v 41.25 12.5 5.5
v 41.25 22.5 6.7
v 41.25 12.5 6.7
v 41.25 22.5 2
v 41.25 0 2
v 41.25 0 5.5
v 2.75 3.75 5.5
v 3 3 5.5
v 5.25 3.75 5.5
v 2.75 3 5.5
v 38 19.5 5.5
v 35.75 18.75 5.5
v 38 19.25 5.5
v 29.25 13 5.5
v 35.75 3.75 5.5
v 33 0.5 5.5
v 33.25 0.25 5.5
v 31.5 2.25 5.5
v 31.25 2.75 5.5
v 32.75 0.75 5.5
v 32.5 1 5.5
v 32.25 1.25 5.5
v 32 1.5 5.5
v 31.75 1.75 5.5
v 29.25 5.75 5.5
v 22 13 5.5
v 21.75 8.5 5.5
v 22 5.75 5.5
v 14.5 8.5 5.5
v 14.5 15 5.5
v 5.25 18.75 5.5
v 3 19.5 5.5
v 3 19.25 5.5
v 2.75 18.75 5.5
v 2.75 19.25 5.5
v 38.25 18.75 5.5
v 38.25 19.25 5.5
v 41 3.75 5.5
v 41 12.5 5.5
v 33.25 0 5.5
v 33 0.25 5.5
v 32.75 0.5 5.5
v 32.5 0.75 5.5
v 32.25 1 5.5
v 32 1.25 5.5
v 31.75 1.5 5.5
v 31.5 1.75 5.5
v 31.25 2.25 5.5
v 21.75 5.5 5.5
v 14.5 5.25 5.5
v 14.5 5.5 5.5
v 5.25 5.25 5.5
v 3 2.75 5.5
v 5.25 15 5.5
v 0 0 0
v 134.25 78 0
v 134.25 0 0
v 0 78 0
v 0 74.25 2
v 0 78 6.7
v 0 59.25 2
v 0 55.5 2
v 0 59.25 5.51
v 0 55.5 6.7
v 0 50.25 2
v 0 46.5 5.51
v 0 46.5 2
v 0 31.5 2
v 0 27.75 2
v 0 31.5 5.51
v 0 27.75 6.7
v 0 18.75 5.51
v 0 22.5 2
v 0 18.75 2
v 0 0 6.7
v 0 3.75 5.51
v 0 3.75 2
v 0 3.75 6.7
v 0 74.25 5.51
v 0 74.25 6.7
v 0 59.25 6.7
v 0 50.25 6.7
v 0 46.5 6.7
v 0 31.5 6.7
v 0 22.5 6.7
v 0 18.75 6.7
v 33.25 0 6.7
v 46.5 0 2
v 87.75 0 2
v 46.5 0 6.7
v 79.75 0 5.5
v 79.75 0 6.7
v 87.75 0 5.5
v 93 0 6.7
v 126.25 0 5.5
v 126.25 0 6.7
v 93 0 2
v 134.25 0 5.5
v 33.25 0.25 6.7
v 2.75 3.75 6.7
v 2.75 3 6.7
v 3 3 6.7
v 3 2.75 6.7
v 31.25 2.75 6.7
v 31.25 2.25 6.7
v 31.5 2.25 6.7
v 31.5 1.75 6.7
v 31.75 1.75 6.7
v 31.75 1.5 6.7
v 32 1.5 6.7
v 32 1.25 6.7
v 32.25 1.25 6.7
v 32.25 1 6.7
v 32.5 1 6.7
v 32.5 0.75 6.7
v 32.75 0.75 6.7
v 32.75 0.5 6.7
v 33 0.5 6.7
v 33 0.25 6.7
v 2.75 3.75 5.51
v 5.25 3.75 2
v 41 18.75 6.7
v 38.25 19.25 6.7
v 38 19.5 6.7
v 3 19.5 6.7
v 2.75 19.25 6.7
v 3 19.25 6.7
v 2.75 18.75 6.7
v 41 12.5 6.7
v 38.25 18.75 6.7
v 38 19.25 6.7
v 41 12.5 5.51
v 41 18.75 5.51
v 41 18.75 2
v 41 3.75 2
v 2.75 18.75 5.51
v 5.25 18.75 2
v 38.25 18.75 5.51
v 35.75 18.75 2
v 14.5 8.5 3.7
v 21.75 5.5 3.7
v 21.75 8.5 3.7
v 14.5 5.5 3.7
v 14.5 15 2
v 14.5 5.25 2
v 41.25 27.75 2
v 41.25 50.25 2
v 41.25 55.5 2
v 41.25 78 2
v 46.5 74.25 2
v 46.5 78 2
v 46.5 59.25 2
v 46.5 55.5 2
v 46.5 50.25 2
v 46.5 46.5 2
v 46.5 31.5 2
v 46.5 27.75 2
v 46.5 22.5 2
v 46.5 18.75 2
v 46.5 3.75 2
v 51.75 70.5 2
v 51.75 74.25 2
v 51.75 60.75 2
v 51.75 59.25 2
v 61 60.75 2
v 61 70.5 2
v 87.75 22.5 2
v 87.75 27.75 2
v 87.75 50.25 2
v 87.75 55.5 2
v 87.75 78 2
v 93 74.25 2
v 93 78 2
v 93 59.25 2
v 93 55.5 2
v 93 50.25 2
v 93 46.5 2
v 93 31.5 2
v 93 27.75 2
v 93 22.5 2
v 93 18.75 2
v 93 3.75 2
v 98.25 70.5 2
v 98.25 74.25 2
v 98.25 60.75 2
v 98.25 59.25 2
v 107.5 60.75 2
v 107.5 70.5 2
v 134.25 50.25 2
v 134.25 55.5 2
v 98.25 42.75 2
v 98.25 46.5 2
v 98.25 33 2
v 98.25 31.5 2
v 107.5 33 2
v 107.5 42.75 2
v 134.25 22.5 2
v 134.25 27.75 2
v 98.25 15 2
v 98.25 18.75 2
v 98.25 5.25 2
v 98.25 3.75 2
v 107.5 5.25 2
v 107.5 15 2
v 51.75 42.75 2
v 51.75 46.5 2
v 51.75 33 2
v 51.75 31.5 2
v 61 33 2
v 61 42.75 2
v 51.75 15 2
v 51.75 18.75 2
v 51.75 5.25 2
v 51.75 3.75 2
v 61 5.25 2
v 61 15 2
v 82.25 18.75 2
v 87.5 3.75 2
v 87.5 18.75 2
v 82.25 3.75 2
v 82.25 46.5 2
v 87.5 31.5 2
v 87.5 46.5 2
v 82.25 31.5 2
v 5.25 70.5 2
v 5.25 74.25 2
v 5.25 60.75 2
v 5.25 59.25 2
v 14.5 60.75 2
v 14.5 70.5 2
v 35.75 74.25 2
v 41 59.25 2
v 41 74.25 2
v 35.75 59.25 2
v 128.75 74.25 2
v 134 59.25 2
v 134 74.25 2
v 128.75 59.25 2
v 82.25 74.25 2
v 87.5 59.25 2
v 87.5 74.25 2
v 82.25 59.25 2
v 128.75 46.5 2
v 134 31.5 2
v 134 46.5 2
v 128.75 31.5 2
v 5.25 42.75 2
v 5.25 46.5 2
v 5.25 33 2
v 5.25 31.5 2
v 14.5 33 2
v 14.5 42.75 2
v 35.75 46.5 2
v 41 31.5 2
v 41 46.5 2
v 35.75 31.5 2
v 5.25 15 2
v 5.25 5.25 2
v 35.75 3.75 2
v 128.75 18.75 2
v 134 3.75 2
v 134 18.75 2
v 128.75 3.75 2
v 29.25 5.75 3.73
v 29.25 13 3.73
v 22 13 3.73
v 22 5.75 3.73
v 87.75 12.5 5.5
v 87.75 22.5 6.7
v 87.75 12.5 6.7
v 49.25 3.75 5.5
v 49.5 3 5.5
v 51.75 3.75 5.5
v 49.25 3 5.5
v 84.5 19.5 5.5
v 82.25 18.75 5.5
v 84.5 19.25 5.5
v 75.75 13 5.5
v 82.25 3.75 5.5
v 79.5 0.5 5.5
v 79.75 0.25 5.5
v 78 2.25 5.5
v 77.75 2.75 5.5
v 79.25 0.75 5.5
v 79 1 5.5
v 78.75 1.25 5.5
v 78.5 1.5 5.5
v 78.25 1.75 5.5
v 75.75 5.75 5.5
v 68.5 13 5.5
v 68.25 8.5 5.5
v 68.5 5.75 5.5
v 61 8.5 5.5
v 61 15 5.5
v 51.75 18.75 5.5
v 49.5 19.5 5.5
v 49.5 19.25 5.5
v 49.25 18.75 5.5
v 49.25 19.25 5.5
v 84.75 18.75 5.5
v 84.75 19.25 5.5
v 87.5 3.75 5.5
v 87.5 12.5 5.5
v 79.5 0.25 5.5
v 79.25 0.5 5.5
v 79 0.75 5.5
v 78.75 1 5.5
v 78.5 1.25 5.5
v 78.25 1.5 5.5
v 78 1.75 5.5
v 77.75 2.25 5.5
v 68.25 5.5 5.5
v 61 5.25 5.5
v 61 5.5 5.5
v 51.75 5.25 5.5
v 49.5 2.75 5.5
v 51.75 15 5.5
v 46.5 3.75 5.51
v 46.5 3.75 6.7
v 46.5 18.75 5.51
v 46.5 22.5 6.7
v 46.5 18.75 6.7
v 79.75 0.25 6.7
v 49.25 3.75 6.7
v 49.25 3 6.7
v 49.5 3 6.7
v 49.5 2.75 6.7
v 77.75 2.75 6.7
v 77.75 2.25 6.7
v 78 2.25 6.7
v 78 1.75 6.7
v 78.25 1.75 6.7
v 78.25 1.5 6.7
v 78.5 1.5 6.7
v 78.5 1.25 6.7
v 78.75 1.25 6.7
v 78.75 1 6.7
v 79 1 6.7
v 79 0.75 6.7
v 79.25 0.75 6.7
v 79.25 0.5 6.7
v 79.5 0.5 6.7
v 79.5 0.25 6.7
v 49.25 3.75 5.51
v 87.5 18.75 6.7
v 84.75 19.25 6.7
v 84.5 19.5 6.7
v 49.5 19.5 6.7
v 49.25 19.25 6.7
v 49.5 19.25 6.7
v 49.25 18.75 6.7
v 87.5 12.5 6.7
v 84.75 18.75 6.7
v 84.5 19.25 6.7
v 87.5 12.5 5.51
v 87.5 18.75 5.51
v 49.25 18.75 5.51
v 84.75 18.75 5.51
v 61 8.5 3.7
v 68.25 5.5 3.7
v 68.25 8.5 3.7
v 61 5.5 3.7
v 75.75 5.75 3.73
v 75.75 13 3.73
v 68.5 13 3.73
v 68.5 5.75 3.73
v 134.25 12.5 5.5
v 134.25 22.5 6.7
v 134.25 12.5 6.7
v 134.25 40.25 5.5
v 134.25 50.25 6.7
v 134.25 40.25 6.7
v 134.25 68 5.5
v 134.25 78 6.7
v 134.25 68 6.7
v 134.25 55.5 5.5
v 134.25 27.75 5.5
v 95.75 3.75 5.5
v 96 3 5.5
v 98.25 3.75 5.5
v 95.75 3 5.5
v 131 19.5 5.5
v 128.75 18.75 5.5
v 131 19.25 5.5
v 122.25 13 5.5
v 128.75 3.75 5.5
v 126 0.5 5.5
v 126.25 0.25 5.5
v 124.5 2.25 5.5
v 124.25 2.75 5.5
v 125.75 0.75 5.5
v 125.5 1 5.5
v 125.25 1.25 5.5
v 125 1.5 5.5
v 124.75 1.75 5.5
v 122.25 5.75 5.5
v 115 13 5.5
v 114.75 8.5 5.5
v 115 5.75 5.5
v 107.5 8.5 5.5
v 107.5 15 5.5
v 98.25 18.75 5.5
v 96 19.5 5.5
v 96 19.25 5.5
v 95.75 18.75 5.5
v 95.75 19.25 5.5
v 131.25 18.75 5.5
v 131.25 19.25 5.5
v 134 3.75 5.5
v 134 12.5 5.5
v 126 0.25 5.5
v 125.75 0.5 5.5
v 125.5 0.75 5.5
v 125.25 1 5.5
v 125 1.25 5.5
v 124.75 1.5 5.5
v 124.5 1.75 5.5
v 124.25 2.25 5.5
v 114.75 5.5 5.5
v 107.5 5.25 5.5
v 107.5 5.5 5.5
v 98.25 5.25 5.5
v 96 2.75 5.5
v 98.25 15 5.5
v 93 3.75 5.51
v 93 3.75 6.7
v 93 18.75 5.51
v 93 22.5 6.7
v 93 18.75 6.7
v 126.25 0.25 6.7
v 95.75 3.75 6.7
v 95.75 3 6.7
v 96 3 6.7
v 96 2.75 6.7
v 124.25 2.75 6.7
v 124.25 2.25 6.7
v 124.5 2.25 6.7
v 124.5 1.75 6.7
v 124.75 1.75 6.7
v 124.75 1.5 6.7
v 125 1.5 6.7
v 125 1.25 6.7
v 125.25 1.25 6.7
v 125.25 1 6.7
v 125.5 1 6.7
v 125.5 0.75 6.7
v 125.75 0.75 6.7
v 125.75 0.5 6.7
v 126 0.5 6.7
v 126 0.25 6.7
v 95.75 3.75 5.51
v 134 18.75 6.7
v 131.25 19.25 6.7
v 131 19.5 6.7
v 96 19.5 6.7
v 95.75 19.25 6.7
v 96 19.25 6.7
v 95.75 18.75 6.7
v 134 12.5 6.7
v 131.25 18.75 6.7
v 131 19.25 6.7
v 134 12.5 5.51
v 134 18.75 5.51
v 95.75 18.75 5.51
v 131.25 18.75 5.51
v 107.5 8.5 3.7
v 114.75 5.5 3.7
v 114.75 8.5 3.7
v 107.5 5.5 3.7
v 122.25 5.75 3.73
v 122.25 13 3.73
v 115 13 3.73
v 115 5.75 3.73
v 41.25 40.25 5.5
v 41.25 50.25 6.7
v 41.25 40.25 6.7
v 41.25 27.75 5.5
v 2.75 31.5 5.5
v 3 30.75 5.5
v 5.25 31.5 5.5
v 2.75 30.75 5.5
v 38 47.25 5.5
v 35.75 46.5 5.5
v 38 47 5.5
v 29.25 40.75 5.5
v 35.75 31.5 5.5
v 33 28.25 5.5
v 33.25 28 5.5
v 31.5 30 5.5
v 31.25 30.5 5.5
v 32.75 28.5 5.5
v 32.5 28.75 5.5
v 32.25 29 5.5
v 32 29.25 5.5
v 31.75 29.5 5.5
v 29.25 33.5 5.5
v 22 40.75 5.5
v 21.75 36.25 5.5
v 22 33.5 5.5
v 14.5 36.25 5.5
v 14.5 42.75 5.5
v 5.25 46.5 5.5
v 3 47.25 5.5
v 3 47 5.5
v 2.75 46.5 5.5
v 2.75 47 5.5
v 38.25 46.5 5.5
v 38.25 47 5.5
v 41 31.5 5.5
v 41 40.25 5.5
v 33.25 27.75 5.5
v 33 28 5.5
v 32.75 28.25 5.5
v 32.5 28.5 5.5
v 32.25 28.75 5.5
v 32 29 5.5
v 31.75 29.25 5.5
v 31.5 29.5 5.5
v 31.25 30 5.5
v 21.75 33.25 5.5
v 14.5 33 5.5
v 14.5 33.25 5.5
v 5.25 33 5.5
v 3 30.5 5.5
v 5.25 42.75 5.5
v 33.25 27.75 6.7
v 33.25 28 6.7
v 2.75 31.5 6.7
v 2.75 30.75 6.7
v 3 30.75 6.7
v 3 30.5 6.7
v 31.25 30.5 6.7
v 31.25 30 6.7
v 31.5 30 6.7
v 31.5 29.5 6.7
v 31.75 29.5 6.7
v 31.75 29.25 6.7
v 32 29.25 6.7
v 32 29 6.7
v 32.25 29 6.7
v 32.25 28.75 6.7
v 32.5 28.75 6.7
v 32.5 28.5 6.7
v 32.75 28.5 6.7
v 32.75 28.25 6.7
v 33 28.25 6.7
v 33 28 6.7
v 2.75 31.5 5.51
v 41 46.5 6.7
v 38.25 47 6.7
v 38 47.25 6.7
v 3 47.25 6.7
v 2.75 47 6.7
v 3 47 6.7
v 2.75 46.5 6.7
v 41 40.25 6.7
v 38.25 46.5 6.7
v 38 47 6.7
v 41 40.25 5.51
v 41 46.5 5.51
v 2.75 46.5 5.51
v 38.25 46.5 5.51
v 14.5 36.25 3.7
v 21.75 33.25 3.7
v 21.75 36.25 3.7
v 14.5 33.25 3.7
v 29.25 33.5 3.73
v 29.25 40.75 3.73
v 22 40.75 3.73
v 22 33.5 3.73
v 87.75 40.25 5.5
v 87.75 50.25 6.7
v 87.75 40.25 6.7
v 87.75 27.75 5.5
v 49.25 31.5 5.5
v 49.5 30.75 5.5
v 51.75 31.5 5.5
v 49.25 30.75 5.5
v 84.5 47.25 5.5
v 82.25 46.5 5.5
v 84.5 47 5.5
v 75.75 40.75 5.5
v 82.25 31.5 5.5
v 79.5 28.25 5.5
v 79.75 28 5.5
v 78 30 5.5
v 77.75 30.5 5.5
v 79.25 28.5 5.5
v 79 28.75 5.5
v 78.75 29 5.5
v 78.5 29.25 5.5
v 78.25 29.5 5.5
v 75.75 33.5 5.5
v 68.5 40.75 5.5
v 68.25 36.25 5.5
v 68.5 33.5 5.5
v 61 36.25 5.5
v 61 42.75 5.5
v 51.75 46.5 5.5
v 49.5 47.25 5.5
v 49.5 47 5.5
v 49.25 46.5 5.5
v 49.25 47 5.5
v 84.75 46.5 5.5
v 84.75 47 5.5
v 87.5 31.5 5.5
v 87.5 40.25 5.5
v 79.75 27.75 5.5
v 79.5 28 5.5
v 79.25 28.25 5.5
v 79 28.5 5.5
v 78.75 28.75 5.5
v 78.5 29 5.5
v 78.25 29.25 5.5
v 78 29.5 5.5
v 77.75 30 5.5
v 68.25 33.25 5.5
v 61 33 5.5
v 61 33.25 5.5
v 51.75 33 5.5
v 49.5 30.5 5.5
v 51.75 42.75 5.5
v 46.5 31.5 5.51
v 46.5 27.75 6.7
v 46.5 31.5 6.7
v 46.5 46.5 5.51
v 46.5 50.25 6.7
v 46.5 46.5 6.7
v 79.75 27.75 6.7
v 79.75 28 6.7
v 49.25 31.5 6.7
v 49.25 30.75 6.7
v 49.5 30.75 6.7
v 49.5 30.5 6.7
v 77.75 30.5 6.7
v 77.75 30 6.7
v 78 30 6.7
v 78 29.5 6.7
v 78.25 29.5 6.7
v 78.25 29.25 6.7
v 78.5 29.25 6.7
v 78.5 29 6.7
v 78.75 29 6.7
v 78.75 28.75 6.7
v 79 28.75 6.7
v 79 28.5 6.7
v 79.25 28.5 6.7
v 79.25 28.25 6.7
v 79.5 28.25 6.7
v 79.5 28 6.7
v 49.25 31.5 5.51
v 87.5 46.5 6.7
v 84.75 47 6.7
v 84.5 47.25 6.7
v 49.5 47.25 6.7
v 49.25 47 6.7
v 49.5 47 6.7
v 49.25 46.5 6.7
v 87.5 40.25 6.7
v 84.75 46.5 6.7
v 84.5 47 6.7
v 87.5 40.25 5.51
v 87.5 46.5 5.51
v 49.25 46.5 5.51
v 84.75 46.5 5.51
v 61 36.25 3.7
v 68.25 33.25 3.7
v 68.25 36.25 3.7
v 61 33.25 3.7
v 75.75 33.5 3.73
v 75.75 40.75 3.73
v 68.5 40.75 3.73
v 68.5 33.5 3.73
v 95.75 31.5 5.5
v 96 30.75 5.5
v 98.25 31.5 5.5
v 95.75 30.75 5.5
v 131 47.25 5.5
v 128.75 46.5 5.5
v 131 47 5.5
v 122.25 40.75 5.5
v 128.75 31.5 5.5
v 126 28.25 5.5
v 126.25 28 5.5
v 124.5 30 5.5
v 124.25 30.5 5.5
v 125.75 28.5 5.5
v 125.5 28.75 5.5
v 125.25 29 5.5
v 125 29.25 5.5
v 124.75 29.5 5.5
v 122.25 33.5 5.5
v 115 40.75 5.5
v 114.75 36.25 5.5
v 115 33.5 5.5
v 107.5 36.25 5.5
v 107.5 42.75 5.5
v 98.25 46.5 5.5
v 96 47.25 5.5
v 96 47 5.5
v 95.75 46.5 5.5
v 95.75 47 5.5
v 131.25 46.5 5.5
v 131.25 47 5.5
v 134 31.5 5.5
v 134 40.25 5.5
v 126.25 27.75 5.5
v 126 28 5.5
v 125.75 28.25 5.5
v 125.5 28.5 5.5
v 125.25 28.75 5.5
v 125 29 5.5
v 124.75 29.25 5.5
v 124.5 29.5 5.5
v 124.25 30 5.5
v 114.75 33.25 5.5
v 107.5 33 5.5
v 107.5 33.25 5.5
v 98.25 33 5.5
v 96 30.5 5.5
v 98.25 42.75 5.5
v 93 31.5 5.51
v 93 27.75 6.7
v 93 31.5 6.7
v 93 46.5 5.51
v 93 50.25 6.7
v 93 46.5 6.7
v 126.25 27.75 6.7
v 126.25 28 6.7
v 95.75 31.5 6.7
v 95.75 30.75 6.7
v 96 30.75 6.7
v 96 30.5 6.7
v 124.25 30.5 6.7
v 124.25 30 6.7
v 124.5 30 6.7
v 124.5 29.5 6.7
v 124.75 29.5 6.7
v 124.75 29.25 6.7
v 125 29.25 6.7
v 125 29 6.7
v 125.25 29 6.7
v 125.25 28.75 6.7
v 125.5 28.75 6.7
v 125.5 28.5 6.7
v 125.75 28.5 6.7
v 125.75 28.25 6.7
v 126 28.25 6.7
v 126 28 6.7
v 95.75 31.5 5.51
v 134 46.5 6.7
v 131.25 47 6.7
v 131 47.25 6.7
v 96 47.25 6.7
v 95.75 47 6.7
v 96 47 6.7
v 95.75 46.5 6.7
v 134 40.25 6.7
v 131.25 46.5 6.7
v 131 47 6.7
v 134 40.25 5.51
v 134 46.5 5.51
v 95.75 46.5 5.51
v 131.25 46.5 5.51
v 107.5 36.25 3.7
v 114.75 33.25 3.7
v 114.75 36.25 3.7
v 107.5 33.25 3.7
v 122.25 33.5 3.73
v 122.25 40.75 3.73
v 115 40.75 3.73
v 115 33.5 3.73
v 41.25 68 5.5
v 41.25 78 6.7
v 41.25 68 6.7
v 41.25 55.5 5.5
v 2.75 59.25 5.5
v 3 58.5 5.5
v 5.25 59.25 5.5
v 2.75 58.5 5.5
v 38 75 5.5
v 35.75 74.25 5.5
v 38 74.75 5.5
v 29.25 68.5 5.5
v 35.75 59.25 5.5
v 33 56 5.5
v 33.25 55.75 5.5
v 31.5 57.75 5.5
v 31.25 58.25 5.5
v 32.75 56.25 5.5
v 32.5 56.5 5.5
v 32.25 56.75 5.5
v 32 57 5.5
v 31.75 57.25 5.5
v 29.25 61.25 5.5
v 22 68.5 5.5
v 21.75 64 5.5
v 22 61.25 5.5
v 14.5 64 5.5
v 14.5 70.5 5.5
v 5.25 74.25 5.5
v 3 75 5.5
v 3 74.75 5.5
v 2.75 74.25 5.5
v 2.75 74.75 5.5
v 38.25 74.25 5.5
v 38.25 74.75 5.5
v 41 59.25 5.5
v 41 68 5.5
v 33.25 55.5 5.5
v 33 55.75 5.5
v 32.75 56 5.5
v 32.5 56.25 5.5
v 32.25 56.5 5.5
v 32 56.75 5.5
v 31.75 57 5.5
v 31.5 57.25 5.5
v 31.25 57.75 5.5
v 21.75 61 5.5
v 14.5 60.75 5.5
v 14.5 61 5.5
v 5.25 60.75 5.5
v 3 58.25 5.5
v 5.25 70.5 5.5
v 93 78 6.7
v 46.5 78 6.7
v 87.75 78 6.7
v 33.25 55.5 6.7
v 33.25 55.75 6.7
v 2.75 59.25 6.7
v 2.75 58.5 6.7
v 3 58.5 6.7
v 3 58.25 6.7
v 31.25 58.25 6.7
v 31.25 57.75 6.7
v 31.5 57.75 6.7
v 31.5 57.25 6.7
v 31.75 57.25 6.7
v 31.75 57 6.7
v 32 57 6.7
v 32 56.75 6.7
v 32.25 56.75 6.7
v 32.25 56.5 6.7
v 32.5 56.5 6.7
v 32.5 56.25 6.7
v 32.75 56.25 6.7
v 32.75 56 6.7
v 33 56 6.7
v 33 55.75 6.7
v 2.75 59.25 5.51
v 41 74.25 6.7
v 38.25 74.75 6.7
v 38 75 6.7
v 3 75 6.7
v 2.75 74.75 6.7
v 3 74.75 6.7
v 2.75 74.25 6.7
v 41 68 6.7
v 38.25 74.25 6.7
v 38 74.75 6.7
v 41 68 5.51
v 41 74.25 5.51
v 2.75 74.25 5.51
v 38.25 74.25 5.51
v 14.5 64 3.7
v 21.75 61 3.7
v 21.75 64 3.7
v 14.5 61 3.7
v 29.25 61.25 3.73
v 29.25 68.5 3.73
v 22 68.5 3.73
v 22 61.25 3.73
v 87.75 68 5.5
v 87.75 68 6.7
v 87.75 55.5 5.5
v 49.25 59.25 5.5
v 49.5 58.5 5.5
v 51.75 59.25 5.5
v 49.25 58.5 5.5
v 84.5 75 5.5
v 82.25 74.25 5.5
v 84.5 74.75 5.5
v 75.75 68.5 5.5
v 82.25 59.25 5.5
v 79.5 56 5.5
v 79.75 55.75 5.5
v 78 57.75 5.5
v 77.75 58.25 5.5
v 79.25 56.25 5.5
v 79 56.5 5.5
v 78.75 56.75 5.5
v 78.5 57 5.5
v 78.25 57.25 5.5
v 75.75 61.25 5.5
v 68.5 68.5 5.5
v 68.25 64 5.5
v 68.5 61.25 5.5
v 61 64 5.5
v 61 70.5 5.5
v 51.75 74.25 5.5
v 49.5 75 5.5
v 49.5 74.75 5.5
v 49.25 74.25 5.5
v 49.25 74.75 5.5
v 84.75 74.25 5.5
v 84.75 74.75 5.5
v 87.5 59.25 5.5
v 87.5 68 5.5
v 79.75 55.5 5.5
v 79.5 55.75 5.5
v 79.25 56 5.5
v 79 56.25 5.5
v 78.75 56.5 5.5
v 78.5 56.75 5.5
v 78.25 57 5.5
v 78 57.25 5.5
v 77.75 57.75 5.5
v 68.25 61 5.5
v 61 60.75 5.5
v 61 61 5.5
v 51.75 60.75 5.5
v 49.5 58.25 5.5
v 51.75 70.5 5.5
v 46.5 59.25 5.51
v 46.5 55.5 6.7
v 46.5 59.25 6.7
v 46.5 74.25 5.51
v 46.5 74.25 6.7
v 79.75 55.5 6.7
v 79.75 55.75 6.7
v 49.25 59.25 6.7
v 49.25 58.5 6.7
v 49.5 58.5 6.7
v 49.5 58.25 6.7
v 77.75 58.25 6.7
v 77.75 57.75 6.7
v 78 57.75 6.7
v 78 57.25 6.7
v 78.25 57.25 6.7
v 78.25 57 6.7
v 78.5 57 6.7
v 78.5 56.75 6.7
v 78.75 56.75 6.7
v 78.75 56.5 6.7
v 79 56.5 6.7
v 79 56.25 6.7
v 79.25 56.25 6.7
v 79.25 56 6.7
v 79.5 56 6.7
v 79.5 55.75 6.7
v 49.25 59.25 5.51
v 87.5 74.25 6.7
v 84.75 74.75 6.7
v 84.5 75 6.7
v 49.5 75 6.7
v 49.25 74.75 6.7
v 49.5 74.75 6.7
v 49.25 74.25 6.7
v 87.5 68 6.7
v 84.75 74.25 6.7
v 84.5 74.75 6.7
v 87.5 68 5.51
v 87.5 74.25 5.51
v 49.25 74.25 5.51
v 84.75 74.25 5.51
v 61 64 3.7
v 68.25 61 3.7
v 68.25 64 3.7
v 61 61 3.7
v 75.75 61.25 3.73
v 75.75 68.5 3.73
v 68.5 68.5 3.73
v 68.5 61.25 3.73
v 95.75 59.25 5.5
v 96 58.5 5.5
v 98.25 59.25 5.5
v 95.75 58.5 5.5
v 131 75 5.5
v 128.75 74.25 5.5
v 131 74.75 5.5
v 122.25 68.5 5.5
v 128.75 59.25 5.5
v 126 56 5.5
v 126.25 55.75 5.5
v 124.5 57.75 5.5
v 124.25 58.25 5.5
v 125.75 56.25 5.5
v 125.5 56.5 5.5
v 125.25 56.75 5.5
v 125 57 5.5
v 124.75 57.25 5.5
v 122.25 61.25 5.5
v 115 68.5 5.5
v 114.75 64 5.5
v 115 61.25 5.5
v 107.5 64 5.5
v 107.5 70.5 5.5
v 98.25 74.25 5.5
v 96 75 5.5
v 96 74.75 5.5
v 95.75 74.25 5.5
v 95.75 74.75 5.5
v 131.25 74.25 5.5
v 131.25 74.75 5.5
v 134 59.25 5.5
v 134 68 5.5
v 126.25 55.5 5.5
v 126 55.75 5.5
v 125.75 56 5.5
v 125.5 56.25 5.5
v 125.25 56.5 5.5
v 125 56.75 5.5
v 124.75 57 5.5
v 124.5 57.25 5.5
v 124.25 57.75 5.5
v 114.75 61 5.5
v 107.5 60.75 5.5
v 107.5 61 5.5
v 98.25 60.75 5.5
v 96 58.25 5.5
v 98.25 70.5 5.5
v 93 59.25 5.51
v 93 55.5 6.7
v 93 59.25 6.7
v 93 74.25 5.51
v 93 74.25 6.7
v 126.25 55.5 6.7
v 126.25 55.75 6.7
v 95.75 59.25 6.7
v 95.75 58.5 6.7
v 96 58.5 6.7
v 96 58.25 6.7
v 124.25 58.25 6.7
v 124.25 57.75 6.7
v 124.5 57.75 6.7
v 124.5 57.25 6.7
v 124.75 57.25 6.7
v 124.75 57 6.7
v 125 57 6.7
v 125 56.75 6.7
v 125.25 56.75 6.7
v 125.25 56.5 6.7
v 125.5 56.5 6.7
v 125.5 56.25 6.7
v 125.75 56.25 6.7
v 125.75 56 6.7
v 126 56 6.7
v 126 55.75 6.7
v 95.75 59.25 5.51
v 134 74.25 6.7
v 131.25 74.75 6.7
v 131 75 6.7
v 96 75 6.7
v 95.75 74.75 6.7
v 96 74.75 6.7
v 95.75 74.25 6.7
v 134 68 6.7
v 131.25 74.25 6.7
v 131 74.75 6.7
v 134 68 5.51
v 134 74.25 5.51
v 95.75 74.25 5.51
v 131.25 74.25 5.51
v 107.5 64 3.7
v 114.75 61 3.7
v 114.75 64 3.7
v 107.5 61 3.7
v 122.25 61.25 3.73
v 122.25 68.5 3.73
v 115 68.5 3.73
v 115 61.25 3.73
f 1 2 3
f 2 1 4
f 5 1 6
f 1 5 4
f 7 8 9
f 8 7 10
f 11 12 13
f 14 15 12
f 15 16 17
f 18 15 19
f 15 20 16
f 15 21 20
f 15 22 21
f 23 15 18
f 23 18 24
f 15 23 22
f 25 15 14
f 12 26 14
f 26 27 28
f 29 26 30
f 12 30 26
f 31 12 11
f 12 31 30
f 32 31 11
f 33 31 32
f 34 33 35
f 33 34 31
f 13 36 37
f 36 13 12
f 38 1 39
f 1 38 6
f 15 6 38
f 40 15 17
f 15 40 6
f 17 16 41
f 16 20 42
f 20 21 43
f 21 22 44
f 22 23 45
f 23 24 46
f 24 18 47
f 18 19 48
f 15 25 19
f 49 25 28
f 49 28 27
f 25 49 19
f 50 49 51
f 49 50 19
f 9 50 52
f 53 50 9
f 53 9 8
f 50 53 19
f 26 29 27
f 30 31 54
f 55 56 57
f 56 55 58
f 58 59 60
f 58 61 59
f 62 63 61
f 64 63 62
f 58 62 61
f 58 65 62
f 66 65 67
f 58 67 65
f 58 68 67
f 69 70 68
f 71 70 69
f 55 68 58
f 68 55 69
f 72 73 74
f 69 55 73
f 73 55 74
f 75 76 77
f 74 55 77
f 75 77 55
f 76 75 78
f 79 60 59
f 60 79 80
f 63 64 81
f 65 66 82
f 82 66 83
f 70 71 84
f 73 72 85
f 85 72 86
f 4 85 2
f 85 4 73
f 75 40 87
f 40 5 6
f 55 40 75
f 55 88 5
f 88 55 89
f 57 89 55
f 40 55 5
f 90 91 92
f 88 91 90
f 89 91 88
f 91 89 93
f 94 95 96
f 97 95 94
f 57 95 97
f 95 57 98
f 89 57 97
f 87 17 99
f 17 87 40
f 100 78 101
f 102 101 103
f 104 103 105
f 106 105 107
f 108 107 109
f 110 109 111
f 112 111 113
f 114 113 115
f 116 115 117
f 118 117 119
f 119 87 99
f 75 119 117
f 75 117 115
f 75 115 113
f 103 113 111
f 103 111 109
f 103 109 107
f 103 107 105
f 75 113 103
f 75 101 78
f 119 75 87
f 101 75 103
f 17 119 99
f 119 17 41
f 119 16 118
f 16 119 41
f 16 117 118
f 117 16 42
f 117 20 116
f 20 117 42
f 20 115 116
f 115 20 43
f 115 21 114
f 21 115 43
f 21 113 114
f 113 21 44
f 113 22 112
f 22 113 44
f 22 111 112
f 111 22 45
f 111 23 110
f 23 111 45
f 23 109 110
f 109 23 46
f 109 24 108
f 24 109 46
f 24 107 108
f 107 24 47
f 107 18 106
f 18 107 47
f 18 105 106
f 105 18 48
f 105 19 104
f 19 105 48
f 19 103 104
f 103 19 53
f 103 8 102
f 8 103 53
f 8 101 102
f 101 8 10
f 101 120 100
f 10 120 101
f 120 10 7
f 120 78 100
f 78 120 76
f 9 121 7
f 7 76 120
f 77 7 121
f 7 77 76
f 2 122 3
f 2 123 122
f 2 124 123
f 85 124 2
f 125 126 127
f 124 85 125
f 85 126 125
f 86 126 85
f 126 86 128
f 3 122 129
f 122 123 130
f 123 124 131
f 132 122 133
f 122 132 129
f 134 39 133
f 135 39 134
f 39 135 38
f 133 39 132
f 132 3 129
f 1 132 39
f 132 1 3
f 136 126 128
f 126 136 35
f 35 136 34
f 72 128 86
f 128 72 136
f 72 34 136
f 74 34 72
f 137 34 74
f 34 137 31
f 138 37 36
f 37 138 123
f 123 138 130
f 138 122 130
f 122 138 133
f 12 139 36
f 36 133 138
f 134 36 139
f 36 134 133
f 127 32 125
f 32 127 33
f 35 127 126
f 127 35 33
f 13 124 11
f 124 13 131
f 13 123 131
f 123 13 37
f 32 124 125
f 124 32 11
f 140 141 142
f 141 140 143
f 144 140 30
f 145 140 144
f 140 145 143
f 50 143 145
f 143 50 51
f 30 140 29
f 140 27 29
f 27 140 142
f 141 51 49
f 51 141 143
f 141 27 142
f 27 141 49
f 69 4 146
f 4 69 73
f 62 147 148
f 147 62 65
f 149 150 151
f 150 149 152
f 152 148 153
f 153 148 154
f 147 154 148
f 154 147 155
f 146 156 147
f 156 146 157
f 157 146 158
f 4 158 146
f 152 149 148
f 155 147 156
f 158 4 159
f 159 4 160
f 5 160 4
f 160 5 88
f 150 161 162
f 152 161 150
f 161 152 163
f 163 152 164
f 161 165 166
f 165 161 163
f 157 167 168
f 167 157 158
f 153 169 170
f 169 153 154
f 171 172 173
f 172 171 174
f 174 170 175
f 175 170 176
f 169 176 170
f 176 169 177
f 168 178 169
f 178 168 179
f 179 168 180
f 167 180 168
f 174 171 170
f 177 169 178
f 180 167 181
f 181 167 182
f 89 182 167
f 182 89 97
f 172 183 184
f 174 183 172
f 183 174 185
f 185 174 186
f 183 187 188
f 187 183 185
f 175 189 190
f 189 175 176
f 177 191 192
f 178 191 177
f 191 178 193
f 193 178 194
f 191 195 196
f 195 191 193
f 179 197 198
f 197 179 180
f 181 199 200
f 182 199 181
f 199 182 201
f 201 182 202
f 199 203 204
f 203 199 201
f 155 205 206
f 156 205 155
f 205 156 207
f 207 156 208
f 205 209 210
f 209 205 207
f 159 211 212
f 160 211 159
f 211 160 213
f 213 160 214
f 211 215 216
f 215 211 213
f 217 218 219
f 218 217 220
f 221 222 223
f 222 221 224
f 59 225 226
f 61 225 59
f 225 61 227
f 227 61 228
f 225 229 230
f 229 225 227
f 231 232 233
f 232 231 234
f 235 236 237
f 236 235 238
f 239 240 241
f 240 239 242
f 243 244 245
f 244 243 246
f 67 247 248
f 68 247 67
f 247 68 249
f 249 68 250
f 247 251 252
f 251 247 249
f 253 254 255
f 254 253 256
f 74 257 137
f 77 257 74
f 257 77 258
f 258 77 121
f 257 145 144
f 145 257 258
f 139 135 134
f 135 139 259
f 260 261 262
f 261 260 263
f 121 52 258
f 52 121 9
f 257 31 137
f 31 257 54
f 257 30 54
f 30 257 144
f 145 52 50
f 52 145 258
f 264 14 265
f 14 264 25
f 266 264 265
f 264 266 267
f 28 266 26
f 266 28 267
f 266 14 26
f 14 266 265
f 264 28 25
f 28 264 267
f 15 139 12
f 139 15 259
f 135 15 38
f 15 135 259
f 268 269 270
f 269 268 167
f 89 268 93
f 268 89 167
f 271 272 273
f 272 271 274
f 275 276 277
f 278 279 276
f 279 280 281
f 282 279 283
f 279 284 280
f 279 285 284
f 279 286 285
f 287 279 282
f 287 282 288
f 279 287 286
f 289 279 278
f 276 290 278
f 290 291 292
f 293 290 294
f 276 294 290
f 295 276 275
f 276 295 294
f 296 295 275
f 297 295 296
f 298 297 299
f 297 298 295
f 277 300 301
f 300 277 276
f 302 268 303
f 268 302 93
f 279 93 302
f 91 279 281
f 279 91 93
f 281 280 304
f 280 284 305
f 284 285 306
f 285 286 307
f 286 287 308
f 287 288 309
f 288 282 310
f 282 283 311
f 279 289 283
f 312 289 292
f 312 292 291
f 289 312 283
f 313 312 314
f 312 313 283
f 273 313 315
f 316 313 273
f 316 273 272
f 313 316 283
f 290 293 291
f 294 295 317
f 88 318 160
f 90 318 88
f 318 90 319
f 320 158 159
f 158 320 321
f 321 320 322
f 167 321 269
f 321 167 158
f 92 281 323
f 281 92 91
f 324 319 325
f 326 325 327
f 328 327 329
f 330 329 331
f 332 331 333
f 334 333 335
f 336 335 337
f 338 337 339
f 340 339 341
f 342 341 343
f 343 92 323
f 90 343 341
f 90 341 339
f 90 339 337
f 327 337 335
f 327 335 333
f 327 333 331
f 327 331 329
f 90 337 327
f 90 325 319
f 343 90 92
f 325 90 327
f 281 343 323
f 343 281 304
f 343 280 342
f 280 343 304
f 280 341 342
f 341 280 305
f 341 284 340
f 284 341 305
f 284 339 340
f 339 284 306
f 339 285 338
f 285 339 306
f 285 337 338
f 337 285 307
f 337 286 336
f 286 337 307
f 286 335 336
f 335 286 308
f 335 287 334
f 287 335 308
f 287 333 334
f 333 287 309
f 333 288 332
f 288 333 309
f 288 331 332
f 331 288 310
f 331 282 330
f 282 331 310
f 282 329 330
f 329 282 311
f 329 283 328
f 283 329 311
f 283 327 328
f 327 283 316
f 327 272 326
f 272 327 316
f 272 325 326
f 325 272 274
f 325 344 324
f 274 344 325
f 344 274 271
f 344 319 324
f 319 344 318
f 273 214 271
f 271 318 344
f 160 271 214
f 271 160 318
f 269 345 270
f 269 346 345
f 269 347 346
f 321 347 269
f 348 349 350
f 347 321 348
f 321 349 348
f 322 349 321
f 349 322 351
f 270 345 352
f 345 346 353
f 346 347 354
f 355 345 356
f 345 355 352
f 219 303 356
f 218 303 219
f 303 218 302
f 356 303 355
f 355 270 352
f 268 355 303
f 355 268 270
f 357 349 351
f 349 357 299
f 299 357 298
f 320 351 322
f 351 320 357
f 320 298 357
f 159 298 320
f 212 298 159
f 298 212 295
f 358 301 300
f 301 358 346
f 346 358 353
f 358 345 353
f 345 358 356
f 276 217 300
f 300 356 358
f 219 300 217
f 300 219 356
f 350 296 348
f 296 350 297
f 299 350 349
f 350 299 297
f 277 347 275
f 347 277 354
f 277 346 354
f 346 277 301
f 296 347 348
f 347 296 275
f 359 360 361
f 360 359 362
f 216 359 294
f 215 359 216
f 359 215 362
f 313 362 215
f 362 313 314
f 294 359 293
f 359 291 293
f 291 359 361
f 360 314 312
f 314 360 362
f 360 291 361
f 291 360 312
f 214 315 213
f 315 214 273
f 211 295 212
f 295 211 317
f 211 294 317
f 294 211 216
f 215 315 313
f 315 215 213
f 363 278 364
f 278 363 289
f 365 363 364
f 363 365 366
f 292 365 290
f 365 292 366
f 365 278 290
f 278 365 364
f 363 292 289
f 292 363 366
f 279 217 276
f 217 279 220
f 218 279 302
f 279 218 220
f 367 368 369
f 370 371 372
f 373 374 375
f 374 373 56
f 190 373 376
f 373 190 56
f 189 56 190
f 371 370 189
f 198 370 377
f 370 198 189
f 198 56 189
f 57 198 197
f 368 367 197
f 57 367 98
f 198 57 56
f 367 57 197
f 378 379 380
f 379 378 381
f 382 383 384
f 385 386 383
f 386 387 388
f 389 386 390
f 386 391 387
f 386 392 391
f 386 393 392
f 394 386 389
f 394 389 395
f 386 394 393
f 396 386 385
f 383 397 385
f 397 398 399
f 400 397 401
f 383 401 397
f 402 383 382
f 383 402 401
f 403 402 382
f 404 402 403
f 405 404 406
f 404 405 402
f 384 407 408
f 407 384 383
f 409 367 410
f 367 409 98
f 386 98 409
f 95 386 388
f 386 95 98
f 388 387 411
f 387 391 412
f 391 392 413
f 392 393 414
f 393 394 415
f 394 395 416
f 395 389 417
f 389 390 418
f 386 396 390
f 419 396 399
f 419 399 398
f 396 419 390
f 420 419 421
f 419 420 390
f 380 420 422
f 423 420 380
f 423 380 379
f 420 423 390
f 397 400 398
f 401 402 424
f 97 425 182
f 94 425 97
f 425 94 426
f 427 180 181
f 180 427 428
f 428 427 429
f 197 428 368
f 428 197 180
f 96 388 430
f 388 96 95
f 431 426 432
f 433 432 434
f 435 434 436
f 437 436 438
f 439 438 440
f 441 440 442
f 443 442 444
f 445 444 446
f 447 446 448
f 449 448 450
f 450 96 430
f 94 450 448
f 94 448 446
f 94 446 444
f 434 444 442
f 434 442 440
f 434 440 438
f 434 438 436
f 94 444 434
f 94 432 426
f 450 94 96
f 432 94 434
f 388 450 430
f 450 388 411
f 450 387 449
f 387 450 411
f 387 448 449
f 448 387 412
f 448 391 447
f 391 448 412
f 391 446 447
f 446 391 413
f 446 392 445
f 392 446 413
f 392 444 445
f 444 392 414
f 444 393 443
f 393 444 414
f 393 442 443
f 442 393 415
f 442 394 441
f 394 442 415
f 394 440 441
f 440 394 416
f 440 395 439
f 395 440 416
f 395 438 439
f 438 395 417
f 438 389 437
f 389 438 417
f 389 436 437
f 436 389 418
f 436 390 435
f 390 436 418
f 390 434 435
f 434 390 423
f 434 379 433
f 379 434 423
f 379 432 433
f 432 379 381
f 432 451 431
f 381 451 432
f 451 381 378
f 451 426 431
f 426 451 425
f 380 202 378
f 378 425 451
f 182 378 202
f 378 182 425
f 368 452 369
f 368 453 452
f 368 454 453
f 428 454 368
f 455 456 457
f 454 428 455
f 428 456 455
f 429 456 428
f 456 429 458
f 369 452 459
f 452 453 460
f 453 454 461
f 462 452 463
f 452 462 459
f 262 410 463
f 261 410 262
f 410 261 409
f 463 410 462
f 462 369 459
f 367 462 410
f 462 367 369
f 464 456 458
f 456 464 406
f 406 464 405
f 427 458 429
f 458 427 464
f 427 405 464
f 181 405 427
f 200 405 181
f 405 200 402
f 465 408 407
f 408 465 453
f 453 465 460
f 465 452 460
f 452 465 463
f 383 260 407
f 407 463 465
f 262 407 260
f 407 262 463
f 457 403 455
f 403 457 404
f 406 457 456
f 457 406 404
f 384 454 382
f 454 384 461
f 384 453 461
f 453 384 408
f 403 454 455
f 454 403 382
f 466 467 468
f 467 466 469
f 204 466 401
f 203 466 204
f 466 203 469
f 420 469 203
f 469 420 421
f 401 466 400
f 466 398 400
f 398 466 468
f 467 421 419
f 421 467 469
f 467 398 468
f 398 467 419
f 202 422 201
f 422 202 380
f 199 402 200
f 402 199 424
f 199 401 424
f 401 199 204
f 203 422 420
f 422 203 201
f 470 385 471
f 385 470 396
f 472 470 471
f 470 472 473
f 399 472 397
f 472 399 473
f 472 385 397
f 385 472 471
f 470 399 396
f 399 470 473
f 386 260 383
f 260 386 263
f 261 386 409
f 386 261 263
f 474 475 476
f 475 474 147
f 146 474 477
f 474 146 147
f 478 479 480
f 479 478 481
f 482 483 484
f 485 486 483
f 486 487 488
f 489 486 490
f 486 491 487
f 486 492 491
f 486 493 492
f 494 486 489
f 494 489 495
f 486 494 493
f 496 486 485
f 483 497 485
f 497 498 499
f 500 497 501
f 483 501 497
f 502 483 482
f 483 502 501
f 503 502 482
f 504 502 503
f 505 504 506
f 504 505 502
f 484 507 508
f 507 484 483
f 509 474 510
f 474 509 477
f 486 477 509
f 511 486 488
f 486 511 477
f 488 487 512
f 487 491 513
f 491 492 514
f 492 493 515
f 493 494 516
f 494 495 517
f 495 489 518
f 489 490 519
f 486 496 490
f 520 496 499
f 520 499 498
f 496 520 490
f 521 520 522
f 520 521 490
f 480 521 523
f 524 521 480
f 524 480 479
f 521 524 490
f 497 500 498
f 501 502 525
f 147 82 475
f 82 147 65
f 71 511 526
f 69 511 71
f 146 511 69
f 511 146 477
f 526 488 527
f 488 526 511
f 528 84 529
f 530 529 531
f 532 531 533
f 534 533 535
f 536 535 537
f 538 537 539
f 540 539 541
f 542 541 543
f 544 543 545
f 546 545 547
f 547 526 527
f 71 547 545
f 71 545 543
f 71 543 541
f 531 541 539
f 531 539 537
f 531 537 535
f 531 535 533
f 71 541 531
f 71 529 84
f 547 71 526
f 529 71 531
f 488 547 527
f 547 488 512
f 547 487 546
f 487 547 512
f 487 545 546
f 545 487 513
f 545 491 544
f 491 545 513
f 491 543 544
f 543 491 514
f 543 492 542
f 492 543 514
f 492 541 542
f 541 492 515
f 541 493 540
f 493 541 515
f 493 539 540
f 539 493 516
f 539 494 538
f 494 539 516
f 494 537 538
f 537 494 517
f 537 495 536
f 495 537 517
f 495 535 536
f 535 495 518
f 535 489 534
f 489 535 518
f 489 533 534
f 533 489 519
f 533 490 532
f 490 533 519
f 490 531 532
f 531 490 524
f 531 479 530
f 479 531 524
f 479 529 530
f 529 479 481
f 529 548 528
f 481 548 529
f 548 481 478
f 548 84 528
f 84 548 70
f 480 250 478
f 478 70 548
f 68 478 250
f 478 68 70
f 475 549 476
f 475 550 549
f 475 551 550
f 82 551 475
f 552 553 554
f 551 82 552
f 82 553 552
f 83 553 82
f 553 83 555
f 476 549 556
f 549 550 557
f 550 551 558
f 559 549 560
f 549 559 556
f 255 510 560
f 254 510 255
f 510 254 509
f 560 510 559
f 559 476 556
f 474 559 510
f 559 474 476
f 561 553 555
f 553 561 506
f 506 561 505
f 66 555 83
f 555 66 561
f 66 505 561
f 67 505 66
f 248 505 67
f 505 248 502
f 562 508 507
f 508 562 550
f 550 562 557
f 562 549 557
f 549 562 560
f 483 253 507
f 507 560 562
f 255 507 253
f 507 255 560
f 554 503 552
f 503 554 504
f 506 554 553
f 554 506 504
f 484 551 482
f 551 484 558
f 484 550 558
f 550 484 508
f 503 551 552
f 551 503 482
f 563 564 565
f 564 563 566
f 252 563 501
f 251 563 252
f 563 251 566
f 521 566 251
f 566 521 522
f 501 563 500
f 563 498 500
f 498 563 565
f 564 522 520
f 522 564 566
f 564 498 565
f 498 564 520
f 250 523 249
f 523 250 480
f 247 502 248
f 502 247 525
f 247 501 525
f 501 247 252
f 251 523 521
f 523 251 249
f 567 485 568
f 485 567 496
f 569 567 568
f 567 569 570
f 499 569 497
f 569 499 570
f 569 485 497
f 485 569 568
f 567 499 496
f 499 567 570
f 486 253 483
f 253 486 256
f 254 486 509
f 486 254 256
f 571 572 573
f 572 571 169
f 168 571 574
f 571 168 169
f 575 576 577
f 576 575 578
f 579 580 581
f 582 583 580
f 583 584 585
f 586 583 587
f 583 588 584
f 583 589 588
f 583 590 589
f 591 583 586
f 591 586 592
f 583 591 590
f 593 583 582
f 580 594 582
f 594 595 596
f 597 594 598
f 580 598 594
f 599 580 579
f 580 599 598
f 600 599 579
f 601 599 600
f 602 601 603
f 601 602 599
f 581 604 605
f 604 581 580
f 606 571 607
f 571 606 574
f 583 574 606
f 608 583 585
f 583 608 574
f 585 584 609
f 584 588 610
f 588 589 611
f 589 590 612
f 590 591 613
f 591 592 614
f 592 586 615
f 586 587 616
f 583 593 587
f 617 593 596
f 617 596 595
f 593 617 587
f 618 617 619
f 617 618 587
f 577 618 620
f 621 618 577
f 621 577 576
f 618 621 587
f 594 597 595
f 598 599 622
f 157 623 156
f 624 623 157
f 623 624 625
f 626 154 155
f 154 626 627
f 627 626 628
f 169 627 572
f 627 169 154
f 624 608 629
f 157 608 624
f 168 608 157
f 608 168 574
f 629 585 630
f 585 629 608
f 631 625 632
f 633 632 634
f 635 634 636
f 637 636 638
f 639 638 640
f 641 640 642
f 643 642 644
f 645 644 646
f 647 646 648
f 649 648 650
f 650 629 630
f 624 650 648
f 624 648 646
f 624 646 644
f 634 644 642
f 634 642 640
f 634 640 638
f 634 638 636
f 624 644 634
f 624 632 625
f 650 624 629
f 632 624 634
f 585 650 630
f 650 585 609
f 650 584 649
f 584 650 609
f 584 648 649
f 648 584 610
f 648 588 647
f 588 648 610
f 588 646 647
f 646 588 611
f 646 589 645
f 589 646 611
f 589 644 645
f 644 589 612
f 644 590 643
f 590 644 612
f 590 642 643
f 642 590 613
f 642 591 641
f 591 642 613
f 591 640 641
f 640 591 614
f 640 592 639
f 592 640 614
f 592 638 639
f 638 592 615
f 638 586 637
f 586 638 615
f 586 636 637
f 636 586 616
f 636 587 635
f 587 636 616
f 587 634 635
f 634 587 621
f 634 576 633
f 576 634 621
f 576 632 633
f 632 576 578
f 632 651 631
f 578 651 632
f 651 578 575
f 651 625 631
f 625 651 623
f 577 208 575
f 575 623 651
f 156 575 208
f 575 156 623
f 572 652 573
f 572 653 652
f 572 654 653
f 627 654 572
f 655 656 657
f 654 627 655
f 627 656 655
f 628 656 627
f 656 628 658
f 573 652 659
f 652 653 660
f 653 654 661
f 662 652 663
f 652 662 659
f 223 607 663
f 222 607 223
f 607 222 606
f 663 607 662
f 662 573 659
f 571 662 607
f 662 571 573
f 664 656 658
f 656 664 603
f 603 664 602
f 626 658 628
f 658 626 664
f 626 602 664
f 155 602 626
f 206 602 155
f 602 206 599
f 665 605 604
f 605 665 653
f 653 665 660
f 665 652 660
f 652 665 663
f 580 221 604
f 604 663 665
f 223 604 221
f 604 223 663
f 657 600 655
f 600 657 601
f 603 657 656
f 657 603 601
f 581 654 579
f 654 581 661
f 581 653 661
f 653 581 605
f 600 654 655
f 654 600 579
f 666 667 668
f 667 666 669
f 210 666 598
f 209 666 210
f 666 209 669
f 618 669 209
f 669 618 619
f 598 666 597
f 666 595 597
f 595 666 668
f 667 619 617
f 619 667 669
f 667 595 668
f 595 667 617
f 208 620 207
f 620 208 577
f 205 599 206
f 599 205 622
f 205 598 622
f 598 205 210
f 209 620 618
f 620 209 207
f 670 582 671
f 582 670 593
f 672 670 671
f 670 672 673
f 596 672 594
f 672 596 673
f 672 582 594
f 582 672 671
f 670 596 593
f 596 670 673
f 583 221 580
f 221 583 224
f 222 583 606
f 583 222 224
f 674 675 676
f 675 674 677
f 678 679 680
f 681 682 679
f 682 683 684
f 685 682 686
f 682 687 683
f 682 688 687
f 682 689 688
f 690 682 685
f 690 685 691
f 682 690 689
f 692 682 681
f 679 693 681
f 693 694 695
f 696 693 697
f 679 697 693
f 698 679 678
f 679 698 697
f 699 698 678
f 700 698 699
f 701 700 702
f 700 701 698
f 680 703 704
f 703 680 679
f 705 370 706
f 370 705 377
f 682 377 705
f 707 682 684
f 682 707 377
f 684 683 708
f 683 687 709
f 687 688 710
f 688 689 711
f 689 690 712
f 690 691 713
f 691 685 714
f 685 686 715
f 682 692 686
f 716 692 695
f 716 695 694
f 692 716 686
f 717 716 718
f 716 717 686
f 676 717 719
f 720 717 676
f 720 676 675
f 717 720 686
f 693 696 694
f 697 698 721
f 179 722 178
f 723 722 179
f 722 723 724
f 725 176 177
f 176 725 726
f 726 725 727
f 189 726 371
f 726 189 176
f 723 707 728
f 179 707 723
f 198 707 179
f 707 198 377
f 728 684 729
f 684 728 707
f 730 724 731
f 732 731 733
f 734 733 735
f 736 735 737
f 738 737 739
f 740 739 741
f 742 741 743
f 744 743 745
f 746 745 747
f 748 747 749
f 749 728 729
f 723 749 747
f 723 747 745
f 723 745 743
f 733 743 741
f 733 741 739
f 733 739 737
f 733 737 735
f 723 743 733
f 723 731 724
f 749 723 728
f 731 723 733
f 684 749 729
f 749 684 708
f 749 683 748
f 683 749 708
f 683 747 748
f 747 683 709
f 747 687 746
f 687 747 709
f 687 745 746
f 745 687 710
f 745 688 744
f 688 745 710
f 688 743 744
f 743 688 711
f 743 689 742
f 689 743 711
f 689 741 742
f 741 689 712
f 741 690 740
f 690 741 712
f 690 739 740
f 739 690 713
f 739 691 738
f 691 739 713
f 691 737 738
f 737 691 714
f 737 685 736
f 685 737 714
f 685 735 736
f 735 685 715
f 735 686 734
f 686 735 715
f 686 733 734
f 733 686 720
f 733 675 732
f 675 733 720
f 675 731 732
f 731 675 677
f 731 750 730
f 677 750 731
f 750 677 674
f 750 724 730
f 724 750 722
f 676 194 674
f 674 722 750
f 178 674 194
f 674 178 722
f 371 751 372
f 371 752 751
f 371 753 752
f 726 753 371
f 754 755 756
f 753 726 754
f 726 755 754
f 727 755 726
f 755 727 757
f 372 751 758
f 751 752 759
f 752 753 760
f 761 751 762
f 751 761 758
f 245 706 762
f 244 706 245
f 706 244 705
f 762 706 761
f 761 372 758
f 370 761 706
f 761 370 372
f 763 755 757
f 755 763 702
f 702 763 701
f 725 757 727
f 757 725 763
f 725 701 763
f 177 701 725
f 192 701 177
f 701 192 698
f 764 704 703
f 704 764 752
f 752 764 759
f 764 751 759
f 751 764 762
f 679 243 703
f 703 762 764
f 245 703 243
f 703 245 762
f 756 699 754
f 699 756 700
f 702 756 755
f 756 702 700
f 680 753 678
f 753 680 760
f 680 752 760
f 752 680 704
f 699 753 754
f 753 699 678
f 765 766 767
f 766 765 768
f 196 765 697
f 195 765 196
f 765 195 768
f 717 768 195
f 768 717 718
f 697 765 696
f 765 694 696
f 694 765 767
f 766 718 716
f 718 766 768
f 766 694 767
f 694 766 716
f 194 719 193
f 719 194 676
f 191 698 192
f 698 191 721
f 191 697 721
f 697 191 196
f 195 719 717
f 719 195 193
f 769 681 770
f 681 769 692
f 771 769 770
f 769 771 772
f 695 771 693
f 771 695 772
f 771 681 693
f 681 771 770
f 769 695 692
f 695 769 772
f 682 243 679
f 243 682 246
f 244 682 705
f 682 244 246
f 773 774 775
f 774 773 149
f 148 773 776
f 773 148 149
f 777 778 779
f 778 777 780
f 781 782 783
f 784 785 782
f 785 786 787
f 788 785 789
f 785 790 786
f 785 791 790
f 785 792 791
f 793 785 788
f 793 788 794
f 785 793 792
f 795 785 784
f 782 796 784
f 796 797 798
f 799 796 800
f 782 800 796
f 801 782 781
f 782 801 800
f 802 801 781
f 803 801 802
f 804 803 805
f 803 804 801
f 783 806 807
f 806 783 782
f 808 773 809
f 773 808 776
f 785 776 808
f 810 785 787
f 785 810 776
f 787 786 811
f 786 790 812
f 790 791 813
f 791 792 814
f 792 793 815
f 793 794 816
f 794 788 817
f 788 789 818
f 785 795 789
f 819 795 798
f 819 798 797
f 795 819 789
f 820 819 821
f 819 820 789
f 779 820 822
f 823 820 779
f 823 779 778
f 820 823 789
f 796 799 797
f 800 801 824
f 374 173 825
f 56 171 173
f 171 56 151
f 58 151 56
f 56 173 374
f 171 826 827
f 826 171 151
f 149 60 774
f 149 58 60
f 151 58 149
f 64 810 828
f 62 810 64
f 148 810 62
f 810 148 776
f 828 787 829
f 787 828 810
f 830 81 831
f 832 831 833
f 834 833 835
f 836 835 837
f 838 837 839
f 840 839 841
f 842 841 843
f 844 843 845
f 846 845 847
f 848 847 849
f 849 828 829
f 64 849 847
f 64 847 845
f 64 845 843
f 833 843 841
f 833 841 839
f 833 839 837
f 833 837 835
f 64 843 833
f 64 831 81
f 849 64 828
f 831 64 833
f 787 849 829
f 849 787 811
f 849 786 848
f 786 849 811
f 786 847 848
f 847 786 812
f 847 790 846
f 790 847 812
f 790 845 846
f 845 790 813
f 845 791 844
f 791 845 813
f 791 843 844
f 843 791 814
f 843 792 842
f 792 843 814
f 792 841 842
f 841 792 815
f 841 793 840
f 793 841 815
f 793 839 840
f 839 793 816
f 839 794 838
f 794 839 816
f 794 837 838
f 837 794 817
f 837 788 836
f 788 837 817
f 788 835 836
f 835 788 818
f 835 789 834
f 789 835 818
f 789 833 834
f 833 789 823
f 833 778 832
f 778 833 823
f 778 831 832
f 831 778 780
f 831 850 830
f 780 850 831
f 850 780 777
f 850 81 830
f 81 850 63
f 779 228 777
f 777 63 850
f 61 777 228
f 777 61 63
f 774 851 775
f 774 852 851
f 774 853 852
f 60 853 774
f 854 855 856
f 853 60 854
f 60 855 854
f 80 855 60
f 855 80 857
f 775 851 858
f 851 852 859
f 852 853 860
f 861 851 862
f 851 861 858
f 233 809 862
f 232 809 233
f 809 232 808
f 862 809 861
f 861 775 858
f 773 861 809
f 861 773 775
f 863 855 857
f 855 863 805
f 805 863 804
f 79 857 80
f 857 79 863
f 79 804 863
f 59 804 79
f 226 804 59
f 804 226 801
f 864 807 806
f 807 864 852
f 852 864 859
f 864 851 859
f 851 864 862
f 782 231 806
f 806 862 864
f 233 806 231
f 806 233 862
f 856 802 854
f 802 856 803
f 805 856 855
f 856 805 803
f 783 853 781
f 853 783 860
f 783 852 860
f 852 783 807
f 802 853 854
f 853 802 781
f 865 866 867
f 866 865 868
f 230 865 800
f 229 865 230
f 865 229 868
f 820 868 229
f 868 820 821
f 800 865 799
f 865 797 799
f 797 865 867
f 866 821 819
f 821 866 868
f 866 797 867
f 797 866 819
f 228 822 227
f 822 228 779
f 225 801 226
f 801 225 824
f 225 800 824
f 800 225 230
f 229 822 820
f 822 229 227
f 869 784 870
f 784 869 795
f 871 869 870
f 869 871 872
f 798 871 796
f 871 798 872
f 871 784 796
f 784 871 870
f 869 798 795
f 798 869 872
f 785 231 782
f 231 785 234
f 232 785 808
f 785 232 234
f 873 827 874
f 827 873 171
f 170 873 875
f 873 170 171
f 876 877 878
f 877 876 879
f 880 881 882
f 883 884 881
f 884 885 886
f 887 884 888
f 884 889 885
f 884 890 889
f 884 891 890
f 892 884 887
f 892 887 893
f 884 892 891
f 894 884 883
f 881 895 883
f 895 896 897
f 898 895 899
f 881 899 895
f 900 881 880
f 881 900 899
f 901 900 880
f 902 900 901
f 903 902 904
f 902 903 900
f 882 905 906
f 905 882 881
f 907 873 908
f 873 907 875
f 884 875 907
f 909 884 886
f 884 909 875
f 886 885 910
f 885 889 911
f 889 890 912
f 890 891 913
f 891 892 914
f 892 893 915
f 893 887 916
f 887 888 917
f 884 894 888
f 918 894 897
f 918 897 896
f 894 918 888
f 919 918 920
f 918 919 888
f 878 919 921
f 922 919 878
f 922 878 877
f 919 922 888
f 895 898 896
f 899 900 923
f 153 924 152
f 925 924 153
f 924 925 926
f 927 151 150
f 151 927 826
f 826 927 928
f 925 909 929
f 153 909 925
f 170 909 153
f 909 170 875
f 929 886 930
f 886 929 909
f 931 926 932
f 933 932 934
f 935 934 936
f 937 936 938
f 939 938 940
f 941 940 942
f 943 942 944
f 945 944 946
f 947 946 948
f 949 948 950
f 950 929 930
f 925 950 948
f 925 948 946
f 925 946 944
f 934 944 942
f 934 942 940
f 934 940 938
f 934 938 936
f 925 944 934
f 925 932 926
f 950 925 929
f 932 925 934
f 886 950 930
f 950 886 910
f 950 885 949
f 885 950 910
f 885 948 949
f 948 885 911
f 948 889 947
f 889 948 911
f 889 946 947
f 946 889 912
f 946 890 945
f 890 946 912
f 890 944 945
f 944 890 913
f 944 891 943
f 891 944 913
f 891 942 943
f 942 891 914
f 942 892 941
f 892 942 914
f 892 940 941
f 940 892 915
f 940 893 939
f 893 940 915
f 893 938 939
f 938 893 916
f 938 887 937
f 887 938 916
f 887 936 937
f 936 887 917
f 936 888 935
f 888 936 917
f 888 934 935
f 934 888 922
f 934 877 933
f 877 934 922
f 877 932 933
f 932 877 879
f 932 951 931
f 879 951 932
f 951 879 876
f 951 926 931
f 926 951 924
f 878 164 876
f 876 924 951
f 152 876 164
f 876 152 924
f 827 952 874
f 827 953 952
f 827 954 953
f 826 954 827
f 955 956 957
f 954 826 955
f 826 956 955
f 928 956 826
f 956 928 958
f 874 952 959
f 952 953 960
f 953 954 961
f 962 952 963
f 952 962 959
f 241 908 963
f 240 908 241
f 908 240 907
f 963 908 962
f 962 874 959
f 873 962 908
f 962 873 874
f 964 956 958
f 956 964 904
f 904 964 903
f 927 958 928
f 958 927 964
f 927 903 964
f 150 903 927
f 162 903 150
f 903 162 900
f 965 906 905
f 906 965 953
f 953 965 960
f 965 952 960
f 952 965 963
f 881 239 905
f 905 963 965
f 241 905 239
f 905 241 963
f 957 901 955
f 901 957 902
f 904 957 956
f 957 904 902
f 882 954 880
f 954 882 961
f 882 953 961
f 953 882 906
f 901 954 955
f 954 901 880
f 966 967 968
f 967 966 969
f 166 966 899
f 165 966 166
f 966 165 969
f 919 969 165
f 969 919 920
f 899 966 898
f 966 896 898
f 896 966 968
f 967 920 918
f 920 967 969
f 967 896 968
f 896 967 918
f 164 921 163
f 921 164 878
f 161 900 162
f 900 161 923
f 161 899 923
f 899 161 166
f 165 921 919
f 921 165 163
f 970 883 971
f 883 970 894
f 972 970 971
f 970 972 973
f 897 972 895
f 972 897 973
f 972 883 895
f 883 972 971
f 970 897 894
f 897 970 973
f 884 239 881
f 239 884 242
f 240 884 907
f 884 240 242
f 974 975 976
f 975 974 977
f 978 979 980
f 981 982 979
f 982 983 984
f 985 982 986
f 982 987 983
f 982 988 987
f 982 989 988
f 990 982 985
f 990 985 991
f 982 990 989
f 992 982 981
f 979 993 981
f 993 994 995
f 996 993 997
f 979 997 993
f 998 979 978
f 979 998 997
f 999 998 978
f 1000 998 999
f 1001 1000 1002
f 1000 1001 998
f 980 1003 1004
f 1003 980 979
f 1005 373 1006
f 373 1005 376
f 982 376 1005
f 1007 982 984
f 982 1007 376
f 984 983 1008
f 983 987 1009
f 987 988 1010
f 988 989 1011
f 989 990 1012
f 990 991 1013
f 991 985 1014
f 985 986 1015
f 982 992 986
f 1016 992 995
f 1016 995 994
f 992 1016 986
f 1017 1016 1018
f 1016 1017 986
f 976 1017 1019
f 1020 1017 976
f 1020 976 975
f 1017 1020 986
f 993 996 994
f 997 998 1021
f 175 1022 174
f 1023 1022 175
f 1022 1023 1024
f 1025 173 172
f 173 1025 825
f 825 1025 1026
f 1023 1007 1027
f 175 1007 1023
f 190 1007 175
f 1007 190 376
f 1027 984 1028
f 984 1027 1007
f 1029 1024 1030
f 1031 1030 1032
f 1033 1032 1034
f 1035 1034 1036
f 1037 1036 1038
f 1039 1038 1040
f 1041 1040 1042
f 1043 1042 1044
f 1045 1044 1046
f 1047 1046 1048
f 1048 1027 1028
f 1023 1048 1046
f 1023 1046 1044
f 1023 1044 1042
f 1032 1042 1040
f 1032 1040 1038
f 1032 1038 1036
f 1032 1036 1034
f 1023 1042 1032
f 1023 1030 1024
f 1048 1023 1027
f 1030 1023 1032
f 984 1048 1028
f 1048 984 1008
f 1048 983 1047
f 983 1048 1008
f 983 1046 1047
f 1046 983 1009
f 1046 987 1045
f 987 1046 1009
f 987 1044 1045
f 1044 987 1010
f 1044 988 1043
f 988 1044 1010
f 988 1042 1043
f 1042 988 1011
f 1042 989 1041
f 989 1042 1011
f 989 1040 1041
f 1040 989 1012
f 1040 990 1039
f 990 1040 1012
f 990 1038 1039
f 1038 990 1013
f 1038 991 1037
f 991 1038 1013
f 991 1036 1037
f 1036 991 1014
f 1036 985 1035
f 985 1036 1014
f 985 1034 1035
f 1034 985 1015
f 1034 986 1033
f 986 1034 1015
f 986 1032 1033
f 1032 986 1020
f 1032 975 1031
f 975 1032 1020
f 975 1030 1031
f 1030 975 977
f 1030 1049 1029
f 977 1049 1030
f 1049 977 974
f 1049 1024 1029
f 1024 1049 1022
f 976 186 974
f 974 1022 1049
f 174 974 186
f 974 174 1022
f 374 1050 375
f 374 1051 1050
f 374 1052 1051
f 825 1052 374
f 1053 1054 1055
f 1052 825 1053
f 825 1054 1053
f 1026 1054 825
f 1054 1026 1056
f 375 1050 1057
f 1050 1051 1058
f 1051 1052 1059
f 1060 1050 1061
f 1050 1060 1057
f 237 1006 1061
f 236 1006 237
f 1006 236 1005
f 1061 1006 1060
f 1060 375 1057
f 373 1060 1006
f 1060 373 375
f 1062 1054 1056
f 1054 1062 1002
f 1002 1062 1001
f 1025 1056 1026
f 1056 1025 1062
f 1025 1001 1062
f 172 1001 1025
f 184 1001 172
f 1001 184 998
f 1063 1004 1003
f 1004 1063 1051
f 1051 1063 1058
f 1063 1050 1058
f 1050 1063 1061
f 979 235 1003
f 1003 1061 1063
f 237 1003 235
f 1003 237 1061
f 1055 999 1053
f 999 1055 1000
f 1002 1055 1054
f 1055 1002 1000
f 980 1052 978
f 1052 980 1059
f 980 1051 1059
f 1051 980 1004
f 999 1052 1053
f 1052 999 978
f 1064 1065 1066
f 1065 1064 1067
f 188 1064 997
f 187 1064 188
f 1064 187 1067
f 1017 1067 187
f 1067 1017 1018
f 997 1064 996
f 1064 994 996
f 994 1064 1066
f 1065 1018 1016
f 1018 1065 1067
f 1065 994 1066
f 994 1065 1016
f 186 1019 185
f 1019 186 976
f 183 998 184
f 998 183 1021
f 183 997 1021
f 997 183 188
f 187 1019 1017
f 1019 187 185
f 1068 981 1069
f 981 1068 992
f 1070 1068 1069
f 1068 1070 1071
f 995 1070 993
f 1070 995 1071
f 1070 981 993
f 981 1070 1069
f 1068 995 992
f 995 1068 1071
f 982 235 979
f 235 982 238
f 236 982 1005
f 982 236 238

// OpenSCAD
// PCB TestKit solder jig for a batch: 9 boards (3 x 3), 46.500 x 27.750 mm apart
module one_board() {
  // Solder jig for usb_dongle_11 - generated by PCB TestKit (the same shape as the STL)
  // Parts go upside-down into the pockets; the PCB goes top-side down onto the support.
  // Each pocket follows its part's 3D shape: one group of cuts per part below.
  W = 41.250; L = 22.500; support = 5.500; cell = 0.2500;
  
  module cut(i, j, w, h, z) { translate([i * cell, j * cell, z]) cube([w * cell, h * cell, support - z + 0.01]); }
  module up(i, j, w, h, z) { translate([i * cell, j * cell, support - 0.01]) cube([w * cell, h * cell, z - support + 0.01]); }
  
  difference() {
    union() {
      cube([W, L, support]);
      up(0, 0, 133, 1, 6.70);
      up(0, 1, 132, 1, 6.70);
      up(0, 2, 131, 1, 6.70);
      up(0, 3, 130, 1, 6.70);
      up(0, 4, 129, 1, 6.70);
      up(0, 5, 128, 1, 6.70);
      up(0, 6, 127, 1, 6.70);
      up(0, 7, 126, 2, 6.70);
      up(0, 9, 125, 2, 6.70);
      up(0, 11, 12, 1, 6.70);
      up(0, 12, 11, 3, 6.70);
      up(164, 50, 1, 40, 6.70);
      up(0, 75, 11, 15, 6.70);
      up(153, 75, 11, 15, 6.70);
      up(11, 77, 1, 13, 6.70);
      up(152, 77, 1, 13, 6.70);
      up(12, 78, 140, 12, 6.70);
    }
    // C1 (relief)
    cut(58, 22, 14, 12, 3.70);
    // C2 (relief)
    cut(72, 22, 15, 12, 3.70);
    // U1 (relief)
    cut(21, 21, 37, 39, 2.00);
    // U2 (relief)
    cut(88, 23, 29, 29, 3.73);
    // notches
    cut(0, 15, 21, 60, 2.00);
    cut(143, 15, 21, 60, 2.00);
  }
}

for (p = [[0.000, 0.000], [46.500, 0.000], [93.000, 0.000], [0.000, 27.750], [46.500, 27.750], [93.000, 27.750], [0.000, 55.500], [46.500, 55.500], [93.000, 55.500]]) translate([p[0], p[1], 0]) one_board();
cube([134.250, 78.000, 2.000]);   // floor web joining the boards
